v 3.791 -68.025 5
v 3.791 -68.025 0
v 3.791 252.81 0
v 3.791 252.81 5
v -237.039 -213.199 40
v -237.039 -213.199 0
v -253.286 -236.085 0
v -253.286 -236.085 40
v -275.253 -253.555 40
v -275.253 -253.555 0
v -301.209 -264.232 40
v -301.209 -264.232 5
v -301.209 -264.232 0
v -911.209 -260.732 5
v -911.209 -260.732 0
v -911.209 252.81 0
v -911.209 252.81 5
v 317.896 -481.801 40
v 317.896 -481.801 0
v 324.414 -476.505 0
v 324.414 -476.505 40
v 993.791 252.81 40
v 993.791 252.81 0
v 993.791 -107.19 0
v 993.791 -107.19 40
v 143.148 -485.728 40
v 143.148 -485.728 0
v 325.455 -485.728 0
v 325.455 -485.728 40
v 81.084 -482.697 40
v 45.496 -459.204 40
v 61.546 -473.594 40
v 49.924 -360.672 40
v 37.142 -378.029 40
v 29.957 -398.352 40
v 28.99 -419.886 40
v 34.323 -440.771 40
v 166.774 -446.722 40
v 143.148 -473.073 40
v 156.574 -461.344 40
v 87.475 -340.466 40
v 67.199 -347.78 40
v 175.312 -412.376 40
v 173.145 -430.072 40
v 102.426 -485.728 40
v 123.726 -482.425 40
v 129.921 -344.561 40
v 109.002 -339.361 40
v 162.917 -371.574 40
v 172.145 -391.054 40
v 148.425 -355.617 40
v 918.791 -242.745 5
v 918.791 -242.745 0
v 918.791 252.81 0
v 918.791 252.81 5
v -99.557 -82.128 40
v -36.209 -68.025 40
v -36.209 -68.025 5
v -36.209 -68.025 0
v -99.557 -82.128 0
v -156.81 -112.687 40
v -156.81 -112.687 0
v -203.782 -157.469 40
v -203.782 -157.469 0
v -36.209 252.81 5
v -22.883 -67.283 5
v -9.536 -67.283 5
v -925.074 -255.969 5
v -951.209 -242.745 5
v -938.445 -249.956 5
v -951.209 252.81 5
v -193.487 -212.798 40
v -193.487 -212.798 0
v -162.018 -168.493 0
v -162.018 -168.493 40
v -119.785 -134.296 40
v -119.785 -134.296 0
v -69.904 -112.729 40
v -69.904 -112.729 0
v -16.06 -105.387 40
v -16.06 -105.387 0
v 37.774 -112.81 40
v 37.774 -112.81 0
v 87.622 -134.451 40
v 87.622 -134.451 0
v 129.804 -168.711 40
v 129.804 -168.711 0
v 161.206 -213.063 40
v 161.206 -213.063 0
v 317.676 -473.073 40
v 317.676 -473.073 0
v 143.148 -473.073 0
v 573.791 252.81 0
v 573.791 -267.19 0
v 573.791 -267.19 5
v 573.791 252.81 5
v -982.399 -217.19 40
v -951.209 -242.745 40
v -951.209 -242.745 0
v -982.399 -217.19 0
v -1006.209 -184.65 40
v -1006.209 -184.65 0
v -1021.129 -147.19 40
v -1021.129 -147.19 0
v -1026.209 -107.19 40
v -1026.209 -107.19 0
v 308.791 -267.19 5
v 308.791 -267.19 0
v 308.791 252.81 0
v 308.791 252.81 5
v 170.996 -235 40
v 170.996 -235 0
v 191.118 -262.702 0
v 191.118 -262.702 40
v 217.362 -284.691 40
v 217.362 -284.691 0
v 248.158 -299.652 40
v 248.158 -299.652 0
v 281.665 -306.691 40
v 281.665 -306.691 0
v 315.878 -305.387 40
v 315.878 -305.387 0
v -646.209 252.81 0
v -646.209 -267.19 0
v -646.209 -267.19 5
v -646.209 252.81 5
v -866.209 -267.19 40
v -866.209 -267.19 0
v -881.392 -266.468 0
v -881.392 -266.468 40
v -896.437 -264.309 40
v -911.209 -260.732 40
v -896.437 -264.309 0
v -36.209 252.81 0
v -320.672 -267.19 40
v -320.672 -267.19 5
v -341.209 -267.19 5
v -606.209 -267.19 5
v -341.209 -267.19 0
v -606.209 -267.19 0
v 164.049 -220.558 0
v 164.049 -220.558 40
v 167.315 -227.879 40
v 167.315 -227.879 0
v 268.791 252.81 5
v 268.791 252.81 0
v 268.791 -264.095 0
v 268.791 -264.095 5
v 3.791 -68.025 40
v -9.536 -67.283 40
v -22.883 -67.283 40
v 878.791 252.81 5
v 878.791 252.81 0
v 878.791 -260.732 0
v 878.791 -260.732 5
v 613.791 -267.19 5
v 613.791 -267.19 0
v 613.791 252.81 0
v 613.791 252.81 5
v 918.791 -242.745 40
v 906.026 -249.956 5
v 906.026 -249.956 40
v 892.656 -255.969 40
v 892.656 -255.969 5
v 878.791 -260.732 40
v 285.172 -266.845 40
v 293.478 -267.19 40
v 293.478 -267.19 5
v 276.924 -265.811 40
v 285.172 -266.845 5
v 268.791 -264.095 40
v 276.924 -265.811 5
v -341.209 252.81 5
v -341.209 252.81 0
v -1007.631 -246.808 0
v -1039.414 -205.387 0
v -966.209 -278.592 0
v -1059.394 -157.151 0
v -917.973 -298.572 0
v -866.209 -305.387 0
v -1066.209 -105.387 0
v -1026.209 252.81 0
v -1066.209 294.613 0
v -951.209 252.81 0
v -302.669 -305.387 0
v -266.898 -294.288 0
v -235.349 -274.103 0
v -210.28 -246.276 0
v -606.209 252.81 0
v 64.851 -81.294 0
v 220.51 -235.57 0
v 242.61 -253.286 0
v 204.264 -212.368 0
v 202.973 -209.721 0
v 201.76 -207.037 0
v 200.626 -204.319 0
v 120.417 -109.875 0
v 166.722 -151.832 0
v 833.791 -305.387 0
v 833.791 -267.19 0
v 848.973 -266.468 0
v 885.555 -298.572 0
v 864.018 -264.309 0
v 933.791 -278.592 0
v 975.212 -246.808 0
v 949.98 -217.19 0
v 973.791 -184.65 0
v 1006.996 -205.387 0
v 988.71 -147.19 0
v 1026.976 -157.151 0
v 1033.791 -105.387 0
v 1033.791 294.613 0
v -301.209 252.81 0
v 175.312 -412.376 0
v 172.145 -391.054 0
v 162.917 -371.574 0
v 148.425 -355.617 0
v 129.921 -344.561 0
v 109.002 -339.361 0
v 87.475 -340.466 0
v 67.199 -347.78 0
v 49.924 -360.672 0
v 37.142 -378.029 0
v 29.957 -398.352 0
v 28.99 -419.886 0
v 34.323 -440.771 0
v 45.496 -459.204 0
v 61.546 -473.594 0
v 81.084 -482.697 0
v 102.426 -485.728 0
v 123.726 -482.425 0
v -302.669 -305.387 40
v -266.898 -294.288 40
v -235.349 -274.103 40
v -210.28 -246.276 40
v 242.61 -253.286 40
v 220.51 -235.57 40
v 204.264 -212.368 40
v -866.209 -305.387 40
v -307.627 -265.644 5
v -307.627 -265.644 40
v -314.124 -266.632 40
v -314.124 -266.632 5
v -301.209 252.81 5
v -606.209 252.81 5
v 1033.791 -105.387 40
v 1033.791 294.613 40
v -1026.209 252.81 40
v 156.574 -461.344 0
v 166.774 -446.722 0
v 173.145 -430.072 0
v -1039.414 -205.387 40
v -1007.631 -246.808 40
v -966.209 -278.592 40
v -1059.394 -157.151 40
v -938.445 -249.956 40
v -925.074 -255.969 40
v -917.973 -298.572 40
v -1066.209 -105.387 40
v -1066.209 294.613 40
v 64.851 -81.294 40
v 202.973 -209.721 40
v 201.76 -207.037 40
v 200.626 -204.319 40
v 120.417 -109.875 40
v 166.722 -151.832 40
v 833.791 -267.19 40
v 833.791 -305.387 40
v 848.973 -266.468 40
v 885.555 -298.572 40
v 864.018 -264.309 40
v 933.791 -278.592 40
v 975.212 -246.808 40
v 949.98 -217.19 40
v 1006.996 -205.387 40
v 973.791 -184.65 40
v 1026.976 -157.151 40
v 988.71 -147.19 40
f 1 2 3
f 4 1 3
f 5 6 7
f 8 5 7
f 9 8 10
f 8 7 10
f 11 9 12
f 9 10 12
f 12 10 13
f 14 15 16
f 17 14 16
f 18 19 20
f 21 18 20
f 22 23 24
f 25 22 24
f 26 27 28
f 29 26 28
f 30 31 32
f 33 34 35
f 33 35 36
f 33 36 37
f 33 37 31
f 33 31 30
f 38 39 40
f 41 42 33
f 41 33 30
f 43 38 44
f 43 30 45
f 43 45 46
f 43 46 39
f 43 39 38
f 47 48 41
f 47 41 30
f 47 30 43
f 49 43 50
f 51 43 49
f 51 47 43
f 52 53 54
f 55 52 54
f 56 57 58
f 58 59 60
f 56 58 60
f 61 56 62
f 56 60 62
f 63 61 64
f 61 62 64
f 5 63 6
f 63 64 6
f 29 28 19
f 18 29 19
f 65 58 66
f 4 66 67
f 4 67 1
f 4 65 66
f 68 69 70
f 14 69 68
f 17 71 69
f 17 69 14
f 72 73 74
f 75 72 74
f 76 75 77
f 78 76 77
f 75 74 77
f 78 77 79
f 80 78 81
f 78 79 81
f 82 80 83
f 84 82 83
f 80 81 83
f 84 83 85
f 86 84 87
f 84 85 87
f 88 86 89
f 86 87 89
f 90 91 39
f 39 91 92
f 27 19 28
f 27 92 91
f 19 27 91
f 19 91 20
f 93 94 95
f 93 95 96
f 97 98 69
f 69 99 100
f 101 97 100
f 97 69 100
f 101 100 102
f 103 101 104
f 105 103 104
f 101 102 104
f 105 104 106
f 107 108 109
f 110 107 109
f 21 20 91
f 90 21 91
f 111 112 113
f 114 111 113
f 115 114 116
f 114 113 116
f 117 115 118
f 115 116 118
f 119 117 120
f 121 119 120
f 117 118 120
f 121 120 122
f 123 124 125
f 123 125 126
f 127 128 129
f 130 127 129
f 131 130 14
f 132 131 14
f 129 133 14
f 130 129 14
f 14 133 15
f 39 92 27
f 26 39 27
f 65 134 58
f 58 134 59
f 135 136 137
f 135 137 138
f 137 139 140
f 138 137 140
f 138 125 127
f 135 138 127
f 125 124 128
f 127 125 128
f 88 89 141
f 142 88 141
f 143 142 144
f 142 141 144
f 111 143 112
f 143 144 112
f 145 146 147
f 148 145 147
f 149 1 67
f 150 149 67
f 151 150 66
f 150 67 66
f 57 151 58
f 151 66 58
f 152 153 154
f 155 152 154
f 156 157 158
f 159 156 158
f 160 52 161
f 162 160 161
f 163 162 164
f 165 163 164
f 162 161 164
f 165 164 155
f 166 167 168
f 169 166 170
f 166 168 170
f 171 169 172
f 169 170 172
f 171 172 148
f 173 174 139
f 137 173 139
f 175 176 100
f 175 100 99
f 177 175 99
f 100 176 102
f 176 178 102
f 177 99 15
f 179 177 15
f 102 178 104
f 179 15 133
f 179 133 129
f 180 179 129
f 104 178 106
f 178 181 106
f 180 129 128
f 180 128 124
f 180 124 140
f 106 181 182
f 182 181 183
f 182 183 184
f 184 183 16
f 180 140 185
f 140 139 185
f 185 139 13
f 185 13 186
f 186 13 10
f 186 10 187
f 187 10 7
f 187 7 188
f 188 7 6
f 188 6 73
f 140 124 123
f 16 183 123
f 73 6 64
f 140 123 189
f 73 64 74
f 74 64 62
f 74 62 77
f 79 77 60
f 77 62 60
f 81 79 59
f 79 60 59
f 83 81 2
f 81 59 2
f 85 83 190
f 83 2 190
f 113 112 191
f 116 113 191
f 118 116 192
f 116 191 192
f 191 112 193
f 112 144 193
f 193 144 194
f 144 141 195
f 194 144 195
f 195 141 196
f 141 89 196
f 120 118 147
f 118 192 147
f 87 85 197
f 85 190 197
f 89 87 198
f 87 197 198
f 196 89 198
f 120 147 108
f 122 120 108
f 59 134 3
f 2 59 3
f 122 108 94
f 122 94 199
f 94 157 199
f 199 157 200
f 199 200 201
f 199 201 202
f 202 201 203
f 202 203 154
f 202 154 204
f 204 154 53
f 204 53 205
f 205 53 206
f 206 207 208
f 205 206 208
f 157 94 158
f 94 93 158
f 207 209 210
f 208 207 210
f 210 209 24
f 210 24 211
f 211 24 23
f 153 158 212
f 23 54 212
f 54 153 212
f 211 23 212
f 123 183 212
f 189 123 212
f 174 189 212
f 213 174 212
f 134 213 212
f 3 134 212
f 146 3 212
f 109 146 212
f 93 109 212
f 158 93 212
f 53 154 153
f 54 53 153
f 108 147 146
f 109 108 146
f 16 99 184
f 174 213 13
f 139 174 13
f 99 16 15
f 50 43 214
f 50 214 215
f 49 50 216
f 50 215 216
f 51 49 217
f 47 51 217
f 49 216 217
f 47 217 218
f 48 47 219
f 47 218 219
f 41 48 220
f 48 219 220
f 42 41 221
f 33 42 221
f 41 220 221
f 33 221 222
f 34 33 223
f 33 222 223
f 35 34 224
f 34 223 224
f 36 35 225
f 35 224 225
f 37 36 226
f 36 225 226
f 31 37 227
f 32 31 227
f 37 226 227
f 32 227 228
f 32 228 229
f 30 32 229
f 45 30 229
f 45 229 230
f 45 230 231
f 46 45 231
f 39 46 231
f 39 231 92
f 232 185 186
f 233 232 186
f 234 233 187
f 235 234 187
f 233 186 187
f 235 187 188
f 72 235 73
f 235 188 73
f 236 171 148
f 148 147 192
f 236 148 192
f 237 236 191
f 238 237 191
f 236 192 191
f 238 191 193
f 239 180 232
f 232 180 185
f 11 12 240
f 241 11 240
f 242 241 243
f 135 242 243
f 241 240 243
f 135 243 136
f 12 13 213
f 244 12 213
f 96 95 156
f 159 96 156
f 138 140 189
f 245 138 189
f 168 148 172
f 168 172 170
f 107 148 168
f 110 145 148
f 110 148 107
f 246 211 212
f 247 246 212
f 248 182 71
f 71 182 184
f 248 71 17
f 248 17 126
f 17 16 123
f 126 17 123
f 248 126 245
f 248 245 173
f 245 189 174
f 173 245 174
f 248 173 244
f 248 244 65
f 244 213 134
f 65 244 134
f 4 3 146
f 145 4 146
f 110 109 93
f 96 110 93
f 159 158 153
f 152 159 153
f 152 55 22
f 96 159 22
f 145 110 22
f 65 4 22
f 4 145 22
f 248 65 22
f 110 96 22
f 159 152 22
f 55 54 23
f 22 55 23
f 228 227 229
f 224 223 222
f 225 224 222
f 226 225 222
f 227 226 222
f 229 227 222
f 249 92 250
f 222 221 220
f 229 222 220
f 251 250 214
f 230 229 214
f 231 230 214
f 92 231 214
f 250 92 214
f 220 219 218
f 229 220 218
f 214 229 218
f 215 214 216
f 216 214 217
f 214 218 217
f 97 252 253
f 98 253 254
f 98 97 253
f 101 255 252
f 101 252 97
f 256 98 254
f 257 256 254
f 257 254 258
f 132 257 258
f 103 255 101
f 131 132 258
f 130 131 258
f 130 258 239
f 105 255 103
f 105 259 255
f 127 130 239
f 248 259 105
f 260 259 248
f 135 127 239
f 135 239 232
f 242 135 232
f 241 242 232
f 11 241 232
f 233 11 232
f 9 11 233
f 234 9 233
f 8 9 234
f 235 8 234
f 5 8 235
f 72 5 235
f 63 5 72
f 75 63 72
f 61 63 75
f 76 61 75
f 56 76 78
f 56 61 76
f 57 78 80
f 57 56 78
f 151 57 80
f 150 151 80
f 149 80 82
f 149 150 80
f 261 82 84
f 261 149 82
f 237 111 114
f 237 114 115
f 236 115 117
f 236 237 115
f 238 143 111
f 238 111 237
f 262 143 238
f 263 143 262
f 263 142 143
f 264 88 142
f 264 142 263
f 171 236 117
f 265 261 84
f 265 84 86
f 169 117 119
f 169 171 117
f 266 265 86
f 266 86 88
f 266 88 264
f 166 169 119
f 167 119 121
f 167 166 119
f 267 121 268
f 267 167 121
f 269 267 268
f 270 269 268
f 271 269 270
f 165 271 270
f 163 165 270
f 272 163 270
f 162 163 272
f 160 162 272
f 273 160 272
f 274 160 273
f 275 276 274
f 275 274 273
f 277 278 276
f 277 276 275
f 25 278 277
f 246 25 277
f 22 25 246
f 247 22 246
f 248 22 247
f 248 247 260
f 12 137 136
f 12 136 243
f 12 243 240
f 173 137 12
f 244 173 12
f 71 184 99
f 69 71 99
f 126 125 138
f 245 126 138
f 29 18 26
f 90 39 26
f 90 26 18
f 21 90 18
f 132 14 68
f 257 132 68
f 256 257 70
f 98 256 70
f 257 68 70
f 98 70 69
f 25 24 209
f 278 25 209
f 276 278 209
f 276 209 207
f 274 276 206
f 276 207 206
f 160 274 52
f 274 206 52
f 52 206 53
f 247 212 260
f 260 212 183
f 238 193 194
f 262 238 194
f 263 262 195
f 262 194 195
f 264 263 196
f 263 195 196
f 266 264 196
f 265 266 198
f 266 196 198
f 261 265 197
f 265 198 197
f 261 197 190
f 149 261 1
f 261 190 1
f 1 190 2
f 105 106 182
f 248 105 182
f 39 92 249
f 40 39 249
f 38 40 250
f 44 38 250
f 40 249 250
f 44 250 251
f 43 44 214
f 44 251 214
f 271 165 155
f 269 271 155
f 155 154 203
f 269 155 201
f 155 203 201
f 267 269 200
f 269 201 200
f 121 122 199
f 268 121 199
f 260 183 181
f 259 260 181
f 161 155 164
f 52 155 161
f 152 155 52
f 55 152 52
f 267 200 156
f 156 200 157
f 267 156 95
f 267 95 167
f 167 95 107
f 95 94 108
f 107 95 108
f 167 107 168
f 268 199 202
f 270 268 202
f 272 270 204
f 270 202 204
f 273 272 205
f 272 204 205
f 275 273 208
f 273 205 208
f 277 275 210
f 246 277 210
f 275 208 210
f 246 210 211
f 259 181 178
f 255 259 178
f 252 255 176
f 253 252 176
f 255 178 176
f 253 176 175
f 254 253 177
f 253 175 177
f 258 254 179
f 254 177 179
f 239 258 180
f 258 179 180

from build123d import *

# Parameters (mm, degrees)
F1_DEPTH = 40
F2_DEPTH = 5
F0_W     = 40
F0_H     = 520
F3_DEPTH = 5
F4_DEPTH = 5
F5_DEPTH = 5
F6_DEPTH = 5
F7_DEPTH = 5
F8_DEPTH = 5


with BuildPart() as f1:
    # F0 (on Top) → F1 (new body)
    with BuildSketch(Plane.XY):
        with BuildLine():
            ThreePointArc((143.147528, -473.073424), (166.773863, -446.722334), (175.31182, -412.375763))
            ThreePointArc((175.31182, -412.375763), (37.142125, -378.029192), (143.147528, -473.073424))
        make_face()
        Polygon((317.676343, -473.073424), (143.147528, -473.073424), (143.147528, -485.728025), (325.455095, -485.728025), (317.895805, -481.801136), (324.413556, -476.505198), align=None)
        with BuildLine():
            ThreePointArc((161.206331, -213.062815), (165.629703, -224.241992), (170.99589, -235.000442))
            ThreePointArc((170.99589, -235.000442), (166.430785, -223.884513), (161.206331, -213.062815))
        make_face()
        with BuildLine():
            Line((1033.790737, 294.613262), (-1066.209263, 294.613262))
            Line((-1066.209263, 294.613262), (-1066.209263, -105.386738))
            ThreePointArc((-1066.209263, -105.386738), (-1007.63062, -246.808094), (-866.209263, -305.386738))
            Line((-866.209263, -305.386738), (-302.669152, -305.386738))
            ThreePointArc((-302.669152, -305.386738), (-235.348722, -274.102794), (-193.486715, -212.797835))
            ThreePointArc((-193.486715, -212.797835), (-16.05985, -105.386794), (161.206331, -213.062815))
            ThreePointArc((161.206331, -213.062815), (166.430785, -223.884513), (170.99589, -235.000442))
            ThreePointArc((170.99589, -235.000442), (232.300719, -293.116494), (315.878219, -305.386738))
            Line((315.878219, -305.386738), (833.790737, -305.386738))
            ThreePointArc((833.790737, -305.386738), (975.212093, -246.808094), (1033.790737, -105.386738))
            Line((1033.790737, -105.386738), (1033.790737, 294.613262))
        make_face()
        with BuildLine():
            Line((-1026.209263, -107.190434), (-1026.209263, 252.809566))
            Line((-1026.209263, 252.809566), (-951.209263, 252.809566))
            Line((-951.209263, 252.809566), (-911.209263, 252.809566))
            Line((-911.209263, 252.809566), (-646.209263, 252.809566))
            Line((-646.209263, 252.809566), (-606.209263, 252.809566))
            Line((-606.209263, 252.809566), (-341.209263, 252.809566))
            Line((-341.209263, 252.809566), (-301.209263, 252.809566))
            Line((-301.209263, 252.809566), (-36.209263, 252.809566))
            Line((-36.209263, 252.809566), (3.790737, 252.809566))
            Line((3.790737, 252.809566), (268.790737, 252.809566))
            Line((268.790737, 252.809566), (308.790737, 252.809566))
            Line((308.790737, 252.809566), (573.790737, 252.809566))
            Line((573.790737, 252.809566), (613.790737, 252.809566))
            Line((613.790737, 252.809566), (878.790737, 252.809566))
            Line((878.790737, 252.809566), (918.790737, 252.809566))
            Line((918.790737, 252.809566), (993.790737, 252.809566))
            Line((993.790737, 252.809566), (993.790737, -107.190434))
            ThreePointArc((993.790737, -107.190434), (973.790737, -184.650101), (918.790737, -242.744851))
            ThreePointArc((918.790737, -242.744851), (899.409972, -253.11547), (878.790737, -260.73196))
            ThreePointArc((878.790737, -260.73196), (856.521288, -265.567586), (833.790737, -267.190434))
            Line((833.790737, -267.190434), (613.790737, -267.190434))
            Line((613.790737, -267.190434), (573.790737, -267.190434))
            Line((573.790737, -267.190434), (391.457326, -267.190434))
            Line((391.457326, -267.190434), (308.790737, -267.190434))
            Line((308.790737, -267.190434), (293.477745, -267.190434))
            ThreePointArc((293.477745, -267.190434), (281.037605, -266.413633), (268.790737, -264.095295))
            ThreePointArc((268.790737, -264.095295), (230.929719, -245.21444), (204.264442, -212.367731))
            ThreePointArc((204.264442, -212.367731), (202.356285, -208.38365), (200.625941, -204.319184))
            ThreePointArc((200.625941, -204.319184), (120.417014, -109.875305), (3.790737, -68.025219))
            ThreePointArc((3.790737, -68.025219), (-16.209263, -67.190434), (-36.209263, -68.025219))
            ThreePointArc((-36.209263, -68.025219), (-156.810092, -112.68746), (-237.038771, -213.199324))
            ThreePointArc((-237.038771, -213.199324), (-263.653504, -245.594422), (-301.209263, -264.231786))
            ThreePointArc((-301.209263, -264.231786), (-310.867426, -266.191191), (-320.671553, -267.190434))
            Line((-320.671553, -267.190434), (-341.209263, -267.190434))
            Line((-341.209263, -267.190434), (-606.209263, -267.190434))
            Line((-606.209263, -267.190434), (-646.209263, -267.190434))
            Line((-646.209263, -267.190434), (-866.209263, -267.190434))
            ThreePointArc((-866.209263, -267.190434), (-888.939815, -265.567586), (-911.209263, -260.73196))
            ThreePointArc((-911.209263, -260.73196), (-931.828498, -253.11547), (-951.209263, -242.744851))
            ThreePointArc((-951.209263, -242.744851), (-1006.209263, -184.650101), (-1026.209263, -107.190434))
        make_face(mode=Mode.SUBTRACT)
    extrude(amount=F1_DEPTH)

    # F0 (on Top) → F2 (join)
    with BuildSketch(Plane.XY):
        with BuildLine():
            Line((-911.209263, 252.809566), (-951.209263, 252.809566))
            Line((-951.209263, 252.809566), (-951.209263, -242.744851))
            ThreePointArc((-951.209263, -242.744851), (-931.828498, -253.11547), (-911.209263, -260.73196))
            Line((-911.209263, -260.73196), (-911.209263, 252.809566))
        make_face()
    extrude(amount=F2_DEPTH)

    # F0 (on Top) → F3 (join)
    with BuildSketch(Plane.XY):
        with Locations((-626.209263, -7.190434)):
            Rectangle(F0_W, F0_H)
    extrude(amount=F3_DEPTH)

    # F0 (on Top) → F4 (join)
    with BuildSketch(Plane.XY):
        with BuildLine():
            Line((-301.209263, 252.809566), (-341.209263, 252.809566))
            Line((-341.209263, 252.809566), (-341.209263, -267.190434))
            Line((-341.209263, -267.190434), (-320.671553, -267.190434))
            ThreePointArc((-320.671553, -267.190434), (-310.867426, -266.191191), (-301.209263, -264.231786))
            Line((-301.209263, -264.231786), (-301.209263, 252.809566))
        make_face()
    extrude(amount=F4_DEPTH)

    # F0 (on Top) → F5 (join)
    with BuildSketch(Plane.XY):
        with BuildLine():
            Line((3.790737, 252.809566), (-36.209263, 252.809566))
            Line((-36.209263, 252.809566), (-36.209263, -68.025219))
            ThreePointArc((-36.209263, -68.025219), (-16.209263, -67.190434), (3.790737, -68.025219))
            Line((3.790737, -68.025219), (3.790737, 252.809566))
        make_face()
    extrude(amount=F5_DEPTH)

    # F0 (on Top) → F6 (join)
    with BuildSketch(Plane.XY):
        with BuildLine():
            Line((308.790737, 252.809566), (268.790737, 252.809566))
            Line((268.790737, 252.809566), (268.790737, -264.095295))
            ThreePointArc((268.790737, -264.095295), (281.037605, -266.413633), (293.477745, -267.190434))
            Line((293.477745, -267.190434), (308.790737, -267.190434))
            Line((308.790737, -267.190434), (308.790737, -266.147713))
            Line((308.790737, -266.147713), (308.790737, 252.809566))
        make_face()
    extrude(amount=F6_DEPTH)

    # F0 (on Top) → F7 (join)
    with BuildSketch(Plane.XY):
        with Locations((593.790737, -7.190434)):
            Rectangle(F0_W, F0_H)
    extrude(amount=F7_DEPTH)

    # F0 (on Top) → F8 (join)
    with BuildSketch(Plane.XY):
        with BuildLine():
            Line((918.790737, 252.809566), (878.790737, 252.809566))
            Line((878.790737, 252.809566), (878.790737, -260.73196))
            ThreePointArc((878.790737, -260.73196), (899.409972, -253.11547), (918.790737, -242.744851))
            Line((918.790737, -242.744851), (918.790737, 252.809566))
        make_face()
    extrude(amount=F8_DEPTH)


solid = f1.part
